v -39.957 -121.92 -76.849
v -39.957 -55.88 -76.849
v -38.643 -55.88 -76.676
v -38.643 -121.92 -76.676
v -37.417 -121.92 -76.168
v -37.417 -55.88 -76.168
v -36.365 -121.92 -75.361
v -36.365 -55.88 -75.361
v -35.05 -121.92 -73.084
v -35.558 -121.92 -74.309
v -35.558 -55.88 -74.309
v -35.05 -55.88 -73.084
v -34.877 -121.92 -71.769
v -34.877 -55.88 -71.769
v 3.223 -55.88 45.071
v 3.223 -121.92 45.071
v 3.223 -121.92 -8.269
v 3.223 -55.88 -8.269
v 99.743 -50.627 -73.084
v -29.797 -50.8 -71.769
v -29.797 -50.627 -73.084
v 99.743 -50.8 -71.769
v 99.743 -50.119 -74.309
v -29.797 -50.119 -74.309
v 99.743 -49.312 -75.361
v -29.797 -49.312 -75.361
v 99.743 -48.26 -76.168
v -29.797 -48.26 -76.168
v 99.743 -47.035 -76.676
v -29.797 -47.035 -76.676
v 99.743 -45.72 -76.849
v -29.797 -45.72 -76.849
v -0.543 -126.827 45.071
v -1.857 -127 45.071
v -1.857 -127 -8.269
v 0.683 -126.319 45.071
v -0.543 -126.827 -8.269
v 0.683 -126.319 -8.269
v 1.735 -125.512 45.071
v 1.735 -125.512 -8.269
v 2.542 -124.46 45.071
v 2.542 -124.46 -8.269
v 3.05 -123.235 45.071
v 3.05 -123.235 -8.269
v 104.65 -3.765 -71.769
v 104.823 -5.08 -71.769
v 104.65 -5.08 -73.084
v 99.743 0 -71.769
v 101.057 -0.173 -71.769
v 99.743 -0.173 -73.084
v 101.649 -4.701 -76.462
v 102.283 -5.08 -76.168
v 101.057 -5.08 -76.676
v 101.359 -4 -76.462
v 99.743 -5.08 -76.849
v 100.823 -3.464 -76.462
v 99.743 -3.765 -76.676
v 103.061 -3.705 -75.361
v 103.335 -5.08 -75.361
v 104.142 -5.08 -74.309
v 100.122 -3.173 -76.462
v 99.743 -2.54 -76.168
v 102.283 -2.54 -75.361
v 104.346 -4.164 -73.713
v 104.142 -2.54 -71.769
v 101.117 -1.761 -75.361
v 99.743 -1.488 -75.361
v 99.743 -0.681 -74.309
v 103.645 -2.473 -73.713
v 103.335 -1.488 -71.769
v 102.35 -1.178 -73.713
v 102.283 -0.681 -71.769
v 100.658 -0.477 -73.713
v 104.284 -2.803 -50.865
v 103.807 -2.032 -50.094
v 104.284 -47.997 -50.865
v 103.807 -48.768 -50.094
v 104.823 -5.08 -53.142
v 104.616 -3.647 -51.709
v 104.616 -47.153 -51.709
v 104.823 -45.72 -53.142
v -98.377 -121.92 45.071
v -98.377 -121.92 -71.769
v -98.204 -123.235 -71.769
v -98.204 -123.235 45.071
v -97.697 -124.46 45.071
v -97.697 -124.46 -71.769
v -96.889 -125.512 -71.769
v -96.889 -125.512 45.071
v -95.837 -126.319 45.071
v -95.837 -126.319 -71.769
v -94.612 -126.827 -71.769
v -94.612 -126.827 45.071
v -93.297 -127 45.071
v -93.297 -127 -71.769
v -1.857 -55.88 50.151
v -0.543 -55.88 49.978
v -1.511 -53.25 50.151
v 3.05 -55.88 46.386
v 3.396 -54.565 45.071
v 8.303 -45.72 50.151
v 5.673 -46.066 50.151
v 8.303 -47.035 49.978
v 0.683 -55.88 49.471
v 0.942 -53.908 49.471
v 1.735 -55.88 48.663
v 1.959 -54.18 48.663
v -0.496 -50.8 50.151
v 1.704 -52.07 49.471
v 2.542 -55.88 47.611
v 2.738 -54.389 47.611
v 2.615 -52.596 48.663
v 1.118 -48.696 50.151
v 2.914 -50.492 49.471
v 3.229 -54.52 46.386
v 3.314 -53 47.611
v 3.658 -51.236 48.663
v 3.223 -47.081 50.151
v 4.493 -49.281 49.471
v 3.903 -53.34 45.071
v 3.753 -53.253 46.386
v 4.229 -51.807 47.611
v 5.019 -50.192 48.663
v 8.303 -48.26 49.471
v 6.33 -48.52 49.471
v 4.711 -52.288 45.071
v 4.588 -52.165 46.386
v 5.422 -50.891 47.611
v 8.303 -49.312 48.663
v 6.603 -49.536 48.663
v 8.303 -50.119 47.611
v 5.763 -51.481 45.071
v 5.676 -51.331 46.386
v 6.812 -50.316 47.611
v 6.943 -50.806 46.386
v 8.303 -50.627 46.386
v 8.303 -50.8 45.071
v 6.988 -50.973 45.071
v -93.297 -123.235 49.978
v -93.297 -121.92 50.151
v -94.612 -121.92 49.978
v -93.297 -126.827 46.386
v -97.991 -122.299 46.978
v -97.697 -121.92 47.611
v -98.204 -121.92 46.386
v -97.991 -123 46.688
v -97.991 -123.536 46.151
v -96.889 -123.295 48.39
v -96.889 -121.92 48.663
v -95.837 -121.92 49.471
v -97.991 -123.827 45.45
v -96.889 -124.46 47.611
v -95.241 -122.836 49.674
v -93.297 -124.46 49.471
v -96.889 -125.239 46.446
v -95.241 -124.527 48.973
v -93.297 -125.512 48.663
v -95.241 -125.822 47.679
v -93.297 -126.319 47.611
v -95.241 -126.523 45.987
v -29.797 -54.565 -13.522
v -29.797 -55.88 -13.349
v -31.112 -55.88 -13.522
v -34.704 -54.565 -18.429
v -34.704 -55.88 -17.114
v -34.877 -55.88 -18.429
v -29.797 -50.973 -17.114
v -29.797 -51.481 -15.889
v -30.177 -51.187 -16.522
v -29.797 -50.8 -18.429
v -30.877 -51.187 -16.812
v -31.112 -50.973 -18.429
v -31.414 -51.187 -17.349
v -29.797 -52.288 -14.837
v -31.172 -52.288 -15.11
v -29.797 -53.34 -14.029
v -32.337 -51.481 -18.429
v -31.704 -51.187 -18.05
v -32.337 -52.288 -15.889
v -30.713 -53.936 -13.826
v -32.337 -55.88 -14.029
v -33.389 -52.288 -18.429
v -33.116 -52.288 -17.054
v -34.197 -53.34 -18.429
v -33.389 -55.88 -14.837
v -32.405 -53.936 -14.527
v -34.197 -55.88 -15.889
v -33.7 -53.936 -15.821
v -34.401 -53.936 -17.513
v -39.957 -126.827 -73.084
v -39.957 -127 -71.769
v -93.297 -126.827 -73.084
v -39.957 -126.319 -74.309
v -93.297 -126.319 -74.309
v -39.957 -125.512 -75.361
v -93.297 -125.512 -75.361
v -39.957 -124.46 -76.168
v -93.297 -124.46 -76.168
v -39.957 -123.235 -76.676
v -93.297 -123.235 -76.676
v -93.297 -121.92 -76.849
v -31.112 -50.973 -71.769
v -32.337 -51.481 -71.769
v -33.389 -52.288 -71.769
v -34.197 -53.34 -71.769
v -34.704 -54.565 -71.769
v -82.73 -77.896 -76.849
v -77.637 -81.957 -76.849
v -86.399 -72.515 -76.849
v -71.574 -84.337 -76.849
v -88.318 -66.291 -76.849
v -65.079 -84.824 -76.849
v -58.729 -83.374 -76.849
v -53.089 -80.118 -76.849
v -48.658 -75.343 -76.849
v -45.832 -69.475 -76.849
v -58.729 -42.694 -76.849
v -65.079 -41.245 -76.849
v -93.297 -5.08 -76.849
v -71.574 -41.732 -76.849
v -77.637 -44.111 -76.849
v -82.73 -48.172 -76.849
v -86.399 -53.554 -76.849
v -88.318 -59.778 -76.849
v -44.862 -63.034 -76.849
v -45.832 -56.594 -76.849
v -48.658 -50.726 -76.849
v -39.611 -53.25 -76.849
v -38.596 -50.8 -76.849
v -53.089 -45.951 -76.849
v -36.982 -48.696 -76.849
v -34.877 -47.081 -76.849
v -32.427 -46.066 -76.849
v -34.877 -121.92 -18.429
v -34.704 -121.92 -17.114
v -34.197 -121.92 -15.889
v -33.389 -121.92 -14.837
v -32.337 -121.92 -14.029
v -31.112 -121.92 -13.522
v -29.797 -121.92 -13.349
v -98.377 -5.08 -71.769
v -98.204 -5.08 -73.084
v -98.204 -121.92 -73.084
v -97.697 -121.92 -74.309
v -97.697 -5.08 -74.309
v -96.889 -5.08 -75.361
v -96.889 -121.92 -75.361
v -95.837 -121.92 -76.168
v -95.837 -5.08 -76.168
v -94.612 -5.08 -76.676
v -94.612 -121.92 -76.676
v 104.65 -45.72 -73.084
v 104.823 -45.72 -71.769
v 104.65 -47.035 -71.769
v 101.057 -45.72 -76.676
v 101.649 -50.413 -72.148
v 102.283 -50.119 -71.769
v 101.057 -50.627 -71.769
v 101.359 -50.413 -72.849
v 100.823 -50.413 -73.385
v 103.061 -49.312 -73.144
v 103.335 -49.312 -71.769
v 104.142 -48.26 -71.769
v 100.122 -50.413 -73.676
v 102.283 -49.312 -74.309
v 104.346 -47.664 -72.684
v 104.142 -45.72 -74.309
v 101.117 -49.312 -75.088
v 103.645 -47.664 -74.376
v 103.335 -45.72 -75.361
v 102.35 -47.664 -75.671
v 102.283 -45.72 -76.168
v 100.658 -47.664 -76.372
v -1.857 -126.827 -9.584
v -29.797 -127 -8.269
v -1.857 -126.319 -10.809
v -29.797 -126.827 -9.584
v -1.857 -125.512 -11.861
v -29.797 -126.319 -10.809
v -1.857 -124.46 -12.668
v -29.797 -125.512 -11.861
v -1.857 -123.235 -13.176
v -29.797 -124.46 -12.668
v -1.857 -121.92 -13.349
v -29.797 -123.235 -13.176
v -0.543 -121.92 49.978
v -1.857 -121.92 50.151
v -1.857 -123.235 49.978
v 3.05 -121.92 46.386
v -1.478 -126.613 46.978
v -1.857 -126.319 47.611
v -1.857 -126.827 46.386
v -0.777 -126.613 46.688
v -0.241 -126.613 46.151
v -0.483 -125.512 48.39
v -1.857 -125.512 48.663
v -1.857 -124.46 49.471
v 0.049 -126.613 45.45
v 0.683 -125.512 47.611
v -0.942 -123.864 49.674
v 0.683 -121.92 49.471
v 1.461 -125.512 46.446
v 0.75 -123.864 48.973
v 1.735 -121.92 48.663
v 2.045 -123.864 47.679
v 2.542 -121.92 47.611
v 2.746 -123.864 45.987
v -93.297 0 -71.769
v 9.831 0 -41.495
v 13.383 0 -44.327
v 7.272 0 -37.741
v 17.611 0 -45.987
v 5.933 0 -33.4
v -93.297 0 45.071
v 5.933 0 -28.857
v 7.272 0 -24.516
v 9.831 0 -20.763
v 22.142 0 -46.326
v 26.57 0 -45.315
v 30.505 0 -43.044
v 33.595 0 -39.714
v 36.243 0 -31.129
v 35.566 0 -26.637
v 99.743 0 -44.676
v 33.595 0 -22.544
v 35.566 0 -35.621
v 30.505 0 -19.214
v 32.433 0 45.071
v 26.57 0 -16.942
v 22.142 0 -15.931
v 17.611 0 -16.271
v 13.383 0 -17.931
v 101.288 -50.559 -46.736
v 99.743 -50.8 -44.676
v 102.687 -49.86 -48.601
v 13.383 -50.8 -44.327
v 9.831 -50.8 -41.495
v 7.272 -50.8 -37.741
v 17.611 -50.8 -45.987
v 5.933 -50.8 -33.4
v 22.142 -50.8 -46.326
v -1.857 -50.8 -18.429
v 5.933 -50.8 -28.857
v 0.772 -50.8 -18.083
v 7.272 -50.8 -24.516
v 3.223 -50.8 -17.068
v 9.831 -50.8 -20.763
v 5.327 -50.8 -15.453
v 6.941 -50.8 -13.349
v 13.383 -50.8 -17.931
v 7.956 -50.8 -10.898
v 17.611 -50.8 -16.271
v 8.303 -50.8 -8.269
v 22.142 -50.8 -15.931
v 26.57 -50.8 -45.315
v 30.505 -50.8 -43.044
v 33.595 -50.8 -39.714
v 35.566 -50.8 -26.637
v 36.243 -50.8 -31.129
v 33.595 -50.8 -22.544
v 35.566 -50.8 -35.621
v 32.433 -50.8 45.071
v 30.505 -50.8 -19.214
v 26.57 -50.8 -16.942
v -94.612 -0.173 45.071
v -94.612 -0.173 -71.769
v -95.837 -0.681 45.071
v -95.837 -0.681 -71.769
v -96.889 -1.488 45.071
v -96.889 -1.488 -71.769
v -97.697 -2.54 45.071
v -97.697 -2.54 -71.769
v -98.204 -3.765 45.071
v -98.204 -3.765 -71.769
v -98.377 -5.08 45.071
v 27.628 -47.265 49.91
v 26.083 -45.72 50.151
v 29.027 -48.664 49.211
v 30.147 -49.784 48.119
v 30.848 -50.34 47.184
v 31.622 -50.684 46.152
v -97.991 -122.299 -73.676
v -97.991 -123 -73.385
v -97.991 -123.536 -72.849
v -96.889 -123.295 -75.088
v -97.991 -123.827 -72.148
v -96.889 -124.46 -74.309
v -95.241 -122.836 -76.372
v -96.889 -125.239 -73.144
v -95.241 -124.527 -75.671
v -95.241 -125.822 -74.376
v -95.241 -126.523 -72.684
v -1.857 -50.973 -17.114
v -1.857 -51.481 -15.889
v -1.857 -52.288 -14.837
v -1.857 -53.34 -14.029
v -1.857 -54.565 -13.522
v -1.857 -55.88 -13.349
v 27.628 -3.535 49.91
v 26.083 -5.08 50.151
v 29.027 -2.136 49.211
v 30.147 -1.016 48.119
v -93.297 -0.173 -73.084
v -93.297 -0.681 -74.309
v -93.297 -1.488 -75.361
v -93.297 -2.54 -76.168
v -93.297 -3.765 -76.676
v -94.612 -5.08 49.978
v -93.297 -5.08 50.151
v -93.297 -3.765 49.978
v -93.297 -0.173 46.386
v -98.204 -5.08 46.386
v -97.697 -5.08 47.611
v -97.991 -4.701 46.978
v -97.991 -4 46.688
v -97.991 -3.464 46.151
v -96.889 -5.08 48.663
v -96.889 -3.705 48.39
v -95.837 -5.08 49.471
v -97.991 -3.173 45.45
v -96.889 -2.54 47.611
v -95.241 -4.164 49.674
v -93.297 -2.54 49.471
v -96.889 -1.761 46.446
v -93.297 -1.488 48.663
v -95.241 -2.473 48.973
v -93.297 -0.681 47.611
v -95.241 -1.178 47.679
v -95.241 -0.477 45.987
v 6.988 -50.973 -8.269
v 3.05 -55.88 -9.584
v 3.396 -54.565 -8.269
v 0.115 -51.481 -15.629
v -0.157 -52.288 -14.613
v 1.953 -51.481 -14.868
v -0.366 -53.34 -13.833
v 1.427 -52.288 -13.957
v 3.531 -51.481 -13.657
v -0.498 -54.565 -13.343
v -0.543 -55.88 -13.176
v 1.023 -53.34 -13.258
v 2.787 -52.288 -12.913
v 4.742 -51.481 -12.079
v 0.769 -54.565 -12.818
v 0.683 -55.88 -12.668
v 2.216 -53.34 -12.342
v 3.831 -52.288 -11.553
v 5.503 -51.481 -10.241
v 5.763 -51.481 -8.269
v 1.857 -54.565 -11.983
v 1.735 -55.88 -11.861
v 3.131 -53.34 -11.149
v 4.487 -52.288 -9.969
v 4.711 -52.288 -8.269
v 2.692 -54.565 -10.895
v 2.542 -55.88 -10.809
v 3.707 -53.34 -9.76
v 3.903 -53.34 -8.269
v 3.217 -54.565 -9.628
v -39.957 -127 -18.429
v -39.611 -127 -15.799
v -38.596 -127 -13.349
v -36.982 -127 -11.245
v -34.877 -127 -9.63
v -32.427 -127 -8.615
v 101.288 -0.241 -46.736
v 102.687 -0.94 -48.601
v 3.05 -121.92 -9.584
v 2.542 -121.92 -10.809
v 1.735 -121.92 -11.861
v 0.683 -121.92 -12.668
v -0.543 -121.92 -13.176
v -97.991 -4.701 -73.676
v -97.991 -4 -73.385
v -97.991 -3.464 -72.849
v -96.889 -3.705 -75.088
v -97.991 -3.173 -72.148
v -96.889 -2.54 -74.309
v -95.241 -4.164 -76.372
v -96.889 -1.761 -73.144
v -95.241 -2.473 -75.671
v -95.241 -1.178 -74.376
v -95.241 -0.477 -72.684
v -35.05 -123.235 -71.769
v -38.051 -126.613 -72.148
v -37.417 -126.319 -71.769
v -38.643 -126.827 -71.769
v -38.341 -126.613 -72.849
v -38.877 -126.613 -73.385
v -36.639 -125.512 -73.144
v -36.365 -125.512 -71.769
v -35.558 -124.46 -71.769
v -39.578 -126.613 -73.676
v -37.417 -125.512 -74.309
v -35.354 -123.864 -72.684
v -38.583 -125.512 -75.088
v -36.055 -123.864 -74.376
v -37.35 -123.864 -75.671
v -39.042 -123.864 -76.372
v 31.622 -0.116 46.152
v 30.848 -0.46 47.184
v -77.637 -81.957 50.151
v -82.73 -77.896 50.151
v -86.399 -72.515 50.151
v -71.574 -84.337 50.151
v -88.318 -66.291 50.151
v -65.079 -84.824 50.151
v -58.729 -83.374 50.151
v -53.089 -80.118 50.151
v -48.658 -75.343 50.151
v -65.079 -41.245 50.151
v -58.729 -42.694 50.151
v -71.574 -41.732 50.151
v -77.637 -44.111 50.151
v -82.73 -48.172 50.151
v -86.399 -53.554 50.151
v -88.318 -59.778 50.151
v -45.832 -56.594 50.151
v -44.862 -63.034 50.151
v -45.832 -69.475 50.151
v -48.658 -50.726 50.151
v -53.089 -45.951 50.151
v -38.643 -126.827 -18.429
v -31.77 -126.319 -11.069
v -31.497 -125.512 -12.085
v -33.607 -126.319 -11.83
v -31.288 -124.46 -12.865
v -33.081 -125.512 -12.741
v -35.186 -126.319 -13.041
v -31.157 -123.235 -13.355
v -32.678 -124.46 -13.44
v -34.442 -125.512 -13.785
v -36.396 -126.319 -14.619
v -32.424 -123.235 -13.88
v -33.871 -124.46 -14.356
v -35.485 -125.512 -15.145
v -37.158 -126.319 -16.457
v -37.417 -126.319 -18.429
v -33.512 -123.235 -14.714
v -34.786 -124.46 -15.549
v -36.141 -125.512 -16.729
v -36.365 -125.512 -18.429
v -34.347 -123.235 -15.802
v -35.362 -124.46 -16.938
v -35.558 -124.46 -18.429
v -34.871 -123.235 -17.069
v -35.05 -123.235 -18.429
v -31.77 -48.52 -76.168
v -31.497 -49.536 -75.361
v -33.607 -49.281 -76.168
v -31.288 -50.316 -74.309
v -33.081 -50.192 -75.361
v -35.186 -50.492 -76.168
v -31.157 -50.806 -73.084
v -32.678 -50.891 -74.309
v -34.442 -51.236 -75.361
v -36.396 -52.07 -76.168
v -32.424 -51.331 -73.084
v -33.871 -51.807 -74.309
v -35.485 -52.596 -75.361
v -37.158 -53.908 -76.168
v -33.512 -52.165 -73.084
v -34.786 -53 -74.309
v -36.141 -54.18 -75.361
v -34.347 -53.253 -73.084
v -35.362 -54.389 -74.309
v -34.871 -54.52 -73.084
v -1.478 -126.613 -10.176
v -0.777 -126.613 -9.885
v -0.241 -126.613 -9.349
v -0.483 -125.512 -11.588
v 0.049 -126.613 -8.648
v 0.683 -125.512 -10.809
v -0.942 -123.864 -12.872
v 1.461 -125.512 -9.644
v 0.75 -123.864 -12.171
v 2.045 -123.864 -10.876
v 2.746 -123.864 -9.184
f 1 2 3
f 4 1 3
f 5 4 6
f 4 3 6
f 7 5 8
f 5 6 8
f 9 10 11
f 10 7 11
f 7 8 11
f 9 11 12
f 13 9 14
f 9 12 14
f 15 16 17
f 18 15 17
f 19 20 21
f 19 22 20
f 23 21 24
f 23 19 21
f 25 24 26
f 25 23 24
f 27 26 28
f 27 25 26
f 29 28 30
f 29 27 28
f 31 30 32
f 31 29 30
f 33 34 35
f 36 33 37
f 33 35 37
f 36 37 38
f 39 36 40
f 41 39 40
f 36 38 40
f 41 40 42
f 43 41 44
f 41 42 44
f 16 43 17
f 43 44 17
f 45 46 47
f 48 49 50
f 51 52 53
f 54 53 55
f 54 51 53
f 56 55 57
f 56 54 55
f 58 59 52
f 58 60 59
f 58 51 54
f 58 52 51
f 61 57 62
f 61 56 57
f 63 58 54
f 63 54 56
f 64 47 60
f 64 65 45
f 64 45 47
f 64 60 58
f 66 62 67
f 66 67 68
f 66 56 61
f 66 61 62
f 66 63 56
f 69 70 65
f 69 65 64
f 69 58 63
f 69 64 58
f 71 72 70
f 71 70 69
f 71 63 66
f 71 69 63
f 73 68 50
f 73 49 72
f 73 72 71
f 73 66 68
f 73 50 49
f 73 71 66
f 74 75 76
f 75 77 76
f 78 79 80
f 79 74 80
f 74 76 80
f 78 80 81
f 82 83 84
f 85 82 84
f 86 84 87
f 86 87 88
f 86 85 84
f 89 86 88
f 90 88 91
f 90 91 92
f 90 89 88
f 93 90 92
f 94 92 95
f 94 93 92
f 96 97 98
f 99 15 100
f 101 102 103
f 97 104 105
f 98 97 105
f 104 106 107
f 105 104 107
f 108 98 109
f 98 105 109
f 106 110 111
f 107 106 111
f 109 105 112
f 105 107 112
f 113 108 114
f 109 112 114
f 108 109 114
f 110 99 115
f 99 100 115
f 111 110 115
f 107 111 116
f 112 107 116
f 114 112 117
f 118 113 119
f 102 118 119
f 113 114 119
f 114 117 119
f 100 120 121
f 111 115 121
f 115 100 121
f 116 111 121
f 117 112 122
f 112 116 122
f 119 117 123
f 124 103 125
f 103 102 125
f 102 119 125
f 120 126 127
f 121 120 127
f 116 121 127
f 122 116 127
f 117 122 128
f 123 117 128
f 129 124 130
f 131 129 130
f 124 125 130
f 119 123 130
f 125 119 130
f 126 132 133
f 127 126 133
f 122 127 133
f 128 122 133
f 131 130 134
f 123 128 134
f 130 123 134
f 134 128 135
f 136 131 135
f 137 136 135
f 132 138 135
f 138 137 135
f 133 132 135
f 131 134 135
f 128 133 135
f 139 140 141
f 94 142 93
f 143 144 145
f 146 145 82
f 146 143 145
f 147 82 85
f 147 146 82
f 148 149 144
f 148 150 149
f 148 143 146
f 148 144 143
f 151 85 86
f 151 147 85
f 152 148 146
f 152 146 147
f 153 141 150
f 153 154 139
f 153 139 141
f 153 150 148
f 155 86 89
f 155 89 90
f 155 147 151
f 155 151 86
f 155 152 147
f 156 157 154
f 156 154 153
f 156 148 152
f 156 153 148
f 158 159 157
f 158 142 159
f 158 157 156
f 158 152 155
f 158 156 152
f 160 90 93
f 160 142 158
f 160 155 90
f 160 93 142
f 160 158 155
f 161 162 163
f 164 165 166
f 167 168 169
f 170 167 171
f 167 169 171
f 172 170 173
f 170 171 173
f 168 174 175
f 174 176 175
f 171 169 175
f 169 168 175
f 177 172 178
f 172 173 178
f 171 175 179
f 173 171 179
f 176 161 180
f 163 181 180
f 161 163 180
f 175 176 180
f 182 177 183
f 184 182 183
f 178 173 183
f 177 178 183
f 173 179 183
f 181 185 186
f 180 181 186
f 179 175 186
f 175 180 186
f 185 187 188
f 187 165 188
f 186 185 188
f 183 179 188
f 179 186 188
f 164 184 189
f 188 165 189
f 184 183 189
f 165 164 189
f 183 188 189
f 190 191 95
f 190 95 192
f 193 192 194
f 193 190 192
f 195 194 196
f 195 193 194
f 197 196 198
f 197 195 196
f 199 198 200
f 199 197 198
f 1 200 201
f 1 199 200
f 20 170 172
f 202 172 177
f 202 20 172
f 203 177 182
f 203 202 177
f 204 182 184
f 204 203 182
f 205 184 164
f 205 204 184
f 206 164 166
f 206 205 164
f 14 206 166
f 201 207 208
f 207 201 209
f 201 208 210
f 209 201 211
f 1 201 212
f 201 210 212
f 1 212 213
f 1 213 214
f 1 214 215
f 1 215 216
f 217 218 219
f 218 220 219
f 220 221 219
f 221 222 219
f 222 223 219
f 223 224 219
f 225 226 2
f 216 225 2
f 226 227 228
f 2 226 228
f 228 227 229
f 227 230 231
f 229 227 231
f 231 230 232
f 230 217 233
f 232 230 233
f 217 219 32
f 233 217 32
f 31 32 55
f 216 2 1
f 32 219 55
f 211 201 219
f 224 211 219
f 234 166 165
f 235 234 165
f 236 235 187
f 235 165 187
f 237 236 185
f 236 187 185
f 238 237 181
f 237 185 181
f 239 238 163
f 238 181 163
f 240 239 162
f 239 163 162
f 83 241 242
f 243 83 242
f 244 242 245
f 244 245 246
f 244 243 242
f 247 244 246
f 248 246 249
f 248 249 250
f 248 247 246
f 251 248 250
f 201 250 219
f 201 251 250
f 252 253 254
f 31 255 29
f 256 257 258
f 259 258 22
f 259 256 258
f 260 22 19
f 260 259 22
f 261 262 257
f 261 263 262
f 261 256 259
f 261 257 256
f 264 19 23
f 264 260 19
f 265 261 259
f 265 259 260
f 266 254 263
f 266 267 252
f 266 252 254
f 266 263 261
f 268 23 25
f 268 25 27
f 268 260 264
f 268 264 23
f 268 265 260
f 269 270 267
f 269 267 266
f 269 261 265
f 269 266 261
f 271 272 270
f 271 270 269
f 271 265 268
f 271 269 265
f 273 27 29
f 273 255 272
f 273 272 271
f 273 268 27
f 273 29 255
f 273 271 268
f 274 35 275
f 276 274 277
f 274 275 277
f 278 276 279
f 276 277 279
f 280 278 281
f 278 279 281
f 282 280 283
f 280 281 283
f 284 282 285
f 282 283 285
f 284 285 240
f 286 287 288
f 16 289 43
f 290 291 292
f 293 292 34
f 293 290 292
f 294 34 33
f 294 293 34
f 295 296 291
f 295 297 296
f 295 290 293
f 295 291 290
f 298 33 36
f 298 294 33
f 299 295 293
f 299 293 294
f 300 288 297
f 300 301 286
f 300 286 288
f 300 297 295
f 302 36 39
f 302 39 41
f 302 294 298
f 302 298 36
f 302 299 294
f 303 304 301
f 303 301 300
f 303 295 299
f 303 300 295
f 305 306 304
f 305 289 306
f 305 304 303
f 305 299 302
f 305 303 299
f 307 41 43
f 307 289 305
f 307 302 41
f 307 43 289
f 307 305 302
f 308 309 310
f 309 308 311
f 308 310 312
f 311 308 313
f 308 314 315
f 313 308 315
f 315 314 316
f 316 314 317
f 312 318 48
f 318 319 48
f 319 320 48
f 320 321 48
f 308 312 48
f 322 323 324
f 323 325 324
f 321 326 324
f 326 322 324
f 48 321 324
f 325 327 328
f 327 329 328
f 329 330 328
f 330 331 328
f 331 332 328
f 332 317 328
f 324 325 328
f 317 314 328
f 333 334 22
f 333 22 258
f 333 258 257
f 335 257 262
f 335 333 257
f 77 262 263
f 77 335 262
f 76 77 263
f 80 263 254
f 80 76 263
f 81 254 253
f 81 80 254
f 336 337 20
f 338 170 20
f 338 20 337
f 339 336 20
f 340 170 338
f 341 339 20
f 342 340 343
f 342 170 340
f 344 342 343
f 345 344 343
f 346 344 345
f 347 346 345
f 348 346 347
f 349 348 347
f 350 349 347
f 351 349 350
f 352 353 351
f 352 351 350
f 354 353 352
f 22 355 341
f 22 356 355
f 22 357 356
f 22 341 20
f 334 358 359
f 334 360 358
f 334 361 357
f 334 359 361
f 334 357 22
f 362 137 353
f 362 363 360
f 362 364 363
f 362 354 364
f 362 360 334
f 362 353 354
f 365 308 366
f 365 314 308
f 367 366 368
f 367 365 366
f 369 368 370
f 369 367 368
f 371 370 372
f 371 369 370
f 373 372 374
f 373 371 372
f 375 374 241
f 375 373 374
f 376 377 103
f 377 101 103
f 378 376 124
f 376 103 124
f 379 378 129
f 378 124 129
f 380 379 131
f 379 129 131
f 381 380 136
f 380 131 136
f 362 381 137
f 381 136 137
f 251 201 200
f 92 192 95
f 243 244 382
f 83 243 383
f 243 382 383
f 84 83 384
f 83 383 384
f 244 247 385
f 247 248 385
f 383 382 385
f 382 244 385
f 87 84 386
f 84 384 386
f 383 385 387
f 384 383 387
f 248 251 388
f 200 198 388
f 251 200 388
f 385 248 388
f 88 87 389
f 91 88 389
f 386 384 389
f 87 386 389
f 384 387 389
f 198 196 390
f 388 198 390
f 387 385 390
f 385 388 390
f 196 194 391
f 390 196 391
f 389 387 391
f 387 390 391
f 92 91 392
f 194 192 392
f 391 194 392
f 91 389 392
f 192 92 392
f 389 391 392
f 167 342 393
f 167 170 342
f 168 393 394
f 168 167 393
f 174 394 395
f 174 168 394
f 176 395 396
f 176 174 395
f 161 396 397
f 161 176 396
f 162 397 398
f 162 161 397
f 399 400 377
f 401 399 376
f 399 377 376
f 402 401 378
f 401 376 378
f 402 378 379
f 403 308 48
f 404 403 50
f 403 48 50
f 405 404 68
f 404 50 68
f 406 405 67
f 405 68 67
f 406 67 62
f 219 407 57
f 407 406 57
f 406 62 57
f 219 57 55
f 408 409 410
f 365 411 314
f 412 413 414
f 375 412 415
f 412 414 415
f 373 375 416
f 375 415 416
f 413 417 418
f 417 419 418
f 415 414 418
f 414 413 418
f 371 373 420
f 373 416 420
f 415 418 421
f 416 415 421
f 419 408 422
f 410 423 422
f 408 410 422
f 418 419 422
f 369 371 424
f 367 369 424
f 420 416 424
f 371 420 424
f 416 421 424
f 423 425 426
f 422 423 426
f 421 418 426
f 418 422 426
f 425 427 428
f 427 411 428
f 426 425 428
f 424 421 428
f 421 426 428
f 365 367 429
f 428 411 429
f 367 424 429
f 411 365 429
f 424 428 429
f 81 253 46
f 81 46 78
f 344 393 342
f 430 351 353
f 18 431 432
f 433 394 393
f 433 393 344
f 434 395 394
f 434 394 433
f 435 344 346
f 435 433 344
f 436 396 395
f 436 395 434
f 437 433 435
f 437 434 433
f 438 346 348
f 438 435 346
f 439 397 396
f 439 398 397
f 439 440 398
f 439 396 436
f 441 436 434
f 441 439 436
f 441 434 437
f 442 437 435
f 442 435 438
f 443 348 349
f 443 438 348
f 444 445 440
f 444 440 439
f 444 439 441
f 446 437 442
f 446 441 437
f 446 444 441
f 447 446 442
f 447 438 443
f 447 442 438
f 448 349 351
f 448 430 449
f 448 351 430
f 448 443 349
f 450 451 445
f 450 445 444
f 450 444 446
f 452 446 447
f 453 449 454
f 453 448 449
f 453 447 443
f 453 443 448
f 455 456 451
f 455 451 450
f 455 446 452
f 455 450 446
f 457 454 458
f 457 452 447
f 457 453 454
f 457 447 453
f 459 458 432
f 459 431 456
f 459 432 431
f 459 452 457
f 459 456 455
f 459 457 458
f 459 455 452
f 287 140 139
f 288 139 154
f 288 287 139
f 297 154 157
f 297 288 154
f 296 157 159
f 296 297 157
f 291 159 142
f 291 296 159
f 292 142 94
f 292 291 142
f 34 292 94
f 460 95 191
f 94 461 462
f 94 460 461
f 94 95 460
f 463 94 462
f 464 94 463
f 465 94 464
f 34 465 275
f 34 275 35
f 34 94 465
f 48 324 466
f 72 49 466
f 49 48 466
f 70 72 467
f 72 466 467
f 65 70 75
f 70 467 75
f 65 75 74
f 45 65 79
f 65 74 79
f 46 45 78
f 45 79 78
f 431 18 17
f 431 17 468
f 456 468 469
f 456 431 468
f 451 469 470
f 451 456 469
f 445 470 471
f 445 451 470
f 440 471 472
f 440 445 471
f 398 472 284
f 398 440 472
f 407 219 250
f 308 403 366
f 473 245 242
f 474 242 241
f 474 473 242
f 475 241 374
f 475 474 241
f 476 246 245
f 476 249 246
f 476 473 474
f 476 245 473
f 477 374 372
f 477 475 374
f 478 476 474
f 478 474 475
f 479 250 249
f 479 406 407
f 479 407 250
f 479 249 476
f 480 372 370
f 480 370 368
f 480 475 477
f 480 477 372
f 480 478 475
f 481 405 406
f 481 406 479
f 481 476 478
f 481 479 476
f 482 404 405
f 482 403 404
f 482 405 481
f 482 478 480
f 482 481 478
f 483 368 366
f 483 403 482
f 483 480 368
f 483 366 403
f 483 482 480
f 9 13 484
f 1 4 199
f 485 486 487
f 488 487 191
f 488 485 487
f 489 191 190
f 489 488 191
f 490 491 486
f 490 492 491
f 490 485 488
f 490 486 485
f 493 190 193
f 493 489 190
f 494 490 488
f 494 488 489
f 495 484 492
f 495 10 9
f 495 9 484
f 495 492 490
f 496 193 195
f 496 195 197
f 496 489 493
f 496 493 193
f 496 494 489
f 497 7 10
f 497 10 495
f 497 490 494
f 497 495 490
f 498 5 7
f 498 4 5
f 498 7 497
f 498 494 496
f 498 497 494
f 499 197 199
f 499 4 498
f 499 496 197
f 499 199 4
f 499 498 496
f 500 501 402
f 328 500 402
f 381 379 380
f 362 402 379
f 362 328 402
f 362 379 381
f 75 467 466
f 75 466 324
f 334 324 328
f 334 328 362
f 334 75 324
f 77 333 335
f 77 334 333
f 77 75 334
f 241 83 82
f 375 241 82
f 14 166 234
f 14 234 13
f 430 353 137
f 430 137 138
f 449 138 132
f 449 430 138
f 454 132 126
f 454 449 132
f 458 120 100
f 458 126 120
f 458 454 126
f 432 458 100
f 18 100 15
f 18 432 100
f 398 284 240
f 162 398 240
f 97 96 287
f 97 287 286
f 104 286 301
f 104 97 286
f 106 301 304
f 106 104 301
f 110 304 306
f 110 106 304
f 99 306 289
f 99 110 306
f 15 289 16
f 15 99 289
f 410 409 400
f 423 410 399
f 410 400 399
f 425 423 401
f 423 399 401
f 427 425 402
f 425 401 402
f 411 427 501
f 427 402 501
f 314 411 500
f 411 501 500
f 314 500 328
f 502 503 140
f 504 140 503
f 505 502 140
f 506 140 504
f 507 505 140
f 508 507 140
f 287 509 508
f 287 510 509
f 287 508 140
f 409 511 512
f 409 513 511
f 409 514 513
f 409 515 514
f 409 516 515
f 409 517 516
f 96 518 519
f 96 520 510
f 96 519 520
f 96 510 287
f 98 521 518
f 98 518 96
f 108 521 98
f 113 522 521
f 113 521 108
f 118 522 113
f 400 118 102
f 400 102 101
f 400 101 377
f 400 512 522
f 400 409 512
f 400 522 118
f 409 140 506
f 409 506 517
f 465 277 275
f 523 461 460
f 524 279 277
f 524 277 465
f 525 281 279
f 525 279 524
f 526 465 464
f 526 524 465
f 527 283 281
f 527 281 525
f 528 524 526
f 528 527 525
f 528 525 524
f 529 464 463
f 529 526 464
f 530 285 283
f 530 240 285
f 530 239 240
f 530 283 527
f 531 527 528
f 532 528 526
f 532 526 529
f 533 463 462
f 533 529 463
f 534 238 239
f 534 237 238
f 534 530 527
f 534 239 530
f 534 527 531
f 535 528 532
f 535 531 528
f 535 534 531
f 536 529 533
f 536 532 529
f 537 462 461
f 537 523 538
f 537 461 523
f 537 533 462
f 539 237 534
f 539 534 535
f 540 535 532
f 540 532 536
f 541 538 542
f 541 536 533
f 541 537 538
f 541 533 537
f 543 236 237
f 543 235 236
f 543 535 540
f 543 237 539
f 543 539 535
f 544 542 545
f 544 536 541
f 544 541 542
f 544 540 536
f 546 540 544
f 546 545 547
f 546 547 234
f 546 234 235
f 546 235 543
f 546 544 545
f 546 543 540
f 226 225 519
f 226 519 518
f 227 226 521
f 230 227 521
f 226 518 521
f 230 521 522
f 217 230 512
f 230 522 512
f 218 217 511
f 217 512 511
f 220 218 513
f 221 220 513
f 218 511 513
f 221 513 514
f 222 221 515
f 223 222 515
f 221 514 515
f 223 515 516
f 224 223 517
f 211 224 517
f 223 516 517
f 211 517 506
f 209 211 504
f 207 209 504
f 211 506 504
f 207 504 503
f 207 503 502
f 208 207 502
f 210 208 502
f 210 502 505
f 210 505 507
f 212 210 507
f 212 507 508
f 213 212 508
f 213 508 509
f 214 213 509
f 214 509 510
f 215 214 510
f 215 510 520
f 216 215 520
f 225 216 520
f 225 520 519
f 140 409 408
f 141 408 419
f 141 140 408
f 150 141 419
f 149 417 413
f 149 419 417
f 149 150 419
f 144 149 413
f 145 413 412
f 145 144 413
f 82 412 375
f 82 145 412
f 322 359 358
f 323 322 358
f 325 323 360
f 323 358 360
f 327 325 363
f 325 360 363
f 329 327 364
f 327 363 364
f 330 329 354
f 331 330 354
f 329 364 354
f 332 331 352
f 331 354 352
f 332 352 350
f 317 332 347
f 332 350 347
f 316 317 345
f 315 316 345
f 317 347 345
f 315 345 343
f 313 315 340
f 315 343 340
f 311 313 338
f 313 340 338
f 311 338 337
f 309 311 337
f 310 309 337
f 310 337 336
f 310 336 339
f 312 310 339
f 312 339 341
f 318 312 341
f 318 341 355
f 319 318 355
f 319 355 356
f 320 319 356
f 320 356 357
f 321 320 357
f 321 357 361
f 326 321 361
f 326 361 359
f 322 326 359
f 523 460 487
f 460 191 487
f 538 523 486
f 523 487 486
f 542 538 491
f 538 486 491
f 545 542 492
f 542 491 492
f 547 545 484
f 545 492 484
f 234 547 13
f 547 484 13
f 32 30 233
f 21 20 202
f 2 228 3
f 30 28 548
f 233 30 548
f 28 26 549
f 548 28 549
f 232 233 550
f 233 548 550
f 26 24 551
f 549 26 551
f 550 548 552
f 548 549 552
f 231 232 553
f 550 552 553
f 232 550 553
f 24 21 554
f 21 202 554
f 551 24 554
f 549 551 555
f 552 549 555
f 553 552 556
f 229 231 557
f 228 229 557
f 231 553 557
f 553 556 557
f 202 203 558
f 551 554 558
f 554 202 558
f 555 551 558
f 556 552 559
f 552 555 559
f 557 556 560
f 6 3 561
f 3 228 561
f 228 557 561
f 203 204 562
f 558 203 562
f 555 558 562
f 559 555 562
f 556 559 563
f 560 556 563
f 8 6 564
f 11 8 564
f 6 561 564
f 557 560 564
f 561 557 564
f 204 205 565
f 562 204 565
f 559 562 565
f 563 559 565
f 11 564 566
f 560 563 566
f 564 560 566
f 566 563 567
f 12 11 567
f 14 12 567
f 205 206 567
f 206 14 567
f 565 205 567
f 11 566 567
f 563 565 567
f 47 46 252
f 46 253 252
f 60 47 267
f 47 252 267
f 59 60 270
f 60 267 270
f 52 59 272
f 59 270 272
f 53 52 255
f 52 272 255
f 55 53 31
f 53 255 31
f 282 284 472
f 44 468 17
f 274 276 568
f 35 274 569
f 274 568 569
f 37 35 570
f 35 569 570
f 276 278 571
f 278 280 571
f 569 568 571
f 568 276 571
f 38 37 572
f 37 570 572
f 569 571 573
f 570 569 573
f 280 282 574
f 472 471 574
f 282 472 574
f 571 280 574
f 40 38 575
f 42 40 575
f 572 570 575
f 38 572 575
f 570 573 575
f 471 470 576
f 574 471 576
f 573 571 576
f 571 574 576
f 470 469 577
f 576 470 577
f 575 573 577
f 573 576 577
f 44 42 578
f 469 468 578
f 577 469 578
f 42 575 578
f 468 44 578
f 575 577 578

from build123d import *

# Parameters (mm, degrees)
F0_W     = 203.2
F0_H     = 127
F1_DEPTH = 127
F3_DEPTH = 76.2
F4_SIZE2 = 101.6
F4_SIZE  = 76.2
F5_R     = 5.08
F6_R     = 15.24
F7_DEPTH = 50.801
F8_R     = 21.8504369972
F9_DEPTH = 127.001


with BuildPart() as f1:
    # F0 (on Front) → F1 (new body)
    with BuildSketch(Plane.XZ):
        with Locations((3.2226219773, -13.3488786947)):
            Rectangle(F0_W, F0_H)
    extrude(amount=F1_DEPTH)

    # F2 (on face) → F3 (cut)
    with BuildSketch(Plane.XZ.offset(127)):
        Polygon((-34.8773780227, -13.3488786947), (-34.8773780227, -76.8488786947), (104.8226219773, -76.8488786947), (104.8226219773, 50.1511213053), (3.2226219773, 50.1511213053), (3.2226219773, -13.3488786947), align=None)
    extrude(amount=-F3_DEPTH, mode=Mode.SUBTRACT)

    # F4
    f4_edges = [f1.edges().sort_by_distance(p)[0] for p in [
        (104.822622, -25.4, 50.151121),
    ]]
    f4_side = f1.faces().sort_by_distance((-18.548807, -52.614286, 50.151121))[0]
    chamfer(f4_edges, length=F4_SIZE, length2=F4_SIZE2, reference=f4_side)

    # F5
    f5_edges = [f1.edges().sort_by_distance(p)[0] for p in [
        (3.222622, -88.9, 50.151121),
        (-47.577378, -127, 50.151121),
        (-34.877378, 0, 50.151121),
        (28.622622, -25.4, 50.151121),
        (-98.377378, -63.5, 50.151121),
        (15.922622, -50.8, 50.151121),
        (3.222622, -88.9, -13.348879),
        (-34.877378, -88.9, -13.348879),
        (-15.827378, -127, -13.348879),
        (-15.827378, -50.8, -13.348879),
        (3.222622, -127, 18.401121),
        (3.222622, -50.8, 18.401121),
        (-34.877378, -88.9, -76.848879),
        (-34.877378, -127, -45.098879),
        (-34.877378, -50.8, -45.098879),
        (104.822622, 0, -64.148879),
        (104.822622, -25.4, -51.448879),
        (104.822622, -25.4, -76.848879),
        (104.822622, -50.8, -64.148879),
        (3.222622, 0, -76.848879),
        (34.972622, -50.8, -76.848879),
        (-66.627378, -127, -76.848879),
        (-98.377378, -63.5, -76.848879),
        (-98.377378, 0, -13.348879),
        (-98.377378, -127, -13.348879),
    ]]
    fillet(f5_edges, radius=F5_R)

    # F6 (on face) → F7 (cut, through all)
    with BuildSketch(Plane.XZ.offset(50.8)):
        with Locations((21.0026219773, -31.1288786947)):
            Circle(F6_R)
    extrude(amount=-F7_DEPTH, mode=Mode.SUBTRACT)

    # F8 (on face) → F9 (cut, through all)
    with BuildSketch(Plane.XY.offset(50.1511213053)):
        with Locations((-66.7120441794, -63.0343332887)):
            Circle(F8_R)
    extrude(amount=-F9_DEPTH, mode=Mode.SUBTRACT)


solid = f1.part
